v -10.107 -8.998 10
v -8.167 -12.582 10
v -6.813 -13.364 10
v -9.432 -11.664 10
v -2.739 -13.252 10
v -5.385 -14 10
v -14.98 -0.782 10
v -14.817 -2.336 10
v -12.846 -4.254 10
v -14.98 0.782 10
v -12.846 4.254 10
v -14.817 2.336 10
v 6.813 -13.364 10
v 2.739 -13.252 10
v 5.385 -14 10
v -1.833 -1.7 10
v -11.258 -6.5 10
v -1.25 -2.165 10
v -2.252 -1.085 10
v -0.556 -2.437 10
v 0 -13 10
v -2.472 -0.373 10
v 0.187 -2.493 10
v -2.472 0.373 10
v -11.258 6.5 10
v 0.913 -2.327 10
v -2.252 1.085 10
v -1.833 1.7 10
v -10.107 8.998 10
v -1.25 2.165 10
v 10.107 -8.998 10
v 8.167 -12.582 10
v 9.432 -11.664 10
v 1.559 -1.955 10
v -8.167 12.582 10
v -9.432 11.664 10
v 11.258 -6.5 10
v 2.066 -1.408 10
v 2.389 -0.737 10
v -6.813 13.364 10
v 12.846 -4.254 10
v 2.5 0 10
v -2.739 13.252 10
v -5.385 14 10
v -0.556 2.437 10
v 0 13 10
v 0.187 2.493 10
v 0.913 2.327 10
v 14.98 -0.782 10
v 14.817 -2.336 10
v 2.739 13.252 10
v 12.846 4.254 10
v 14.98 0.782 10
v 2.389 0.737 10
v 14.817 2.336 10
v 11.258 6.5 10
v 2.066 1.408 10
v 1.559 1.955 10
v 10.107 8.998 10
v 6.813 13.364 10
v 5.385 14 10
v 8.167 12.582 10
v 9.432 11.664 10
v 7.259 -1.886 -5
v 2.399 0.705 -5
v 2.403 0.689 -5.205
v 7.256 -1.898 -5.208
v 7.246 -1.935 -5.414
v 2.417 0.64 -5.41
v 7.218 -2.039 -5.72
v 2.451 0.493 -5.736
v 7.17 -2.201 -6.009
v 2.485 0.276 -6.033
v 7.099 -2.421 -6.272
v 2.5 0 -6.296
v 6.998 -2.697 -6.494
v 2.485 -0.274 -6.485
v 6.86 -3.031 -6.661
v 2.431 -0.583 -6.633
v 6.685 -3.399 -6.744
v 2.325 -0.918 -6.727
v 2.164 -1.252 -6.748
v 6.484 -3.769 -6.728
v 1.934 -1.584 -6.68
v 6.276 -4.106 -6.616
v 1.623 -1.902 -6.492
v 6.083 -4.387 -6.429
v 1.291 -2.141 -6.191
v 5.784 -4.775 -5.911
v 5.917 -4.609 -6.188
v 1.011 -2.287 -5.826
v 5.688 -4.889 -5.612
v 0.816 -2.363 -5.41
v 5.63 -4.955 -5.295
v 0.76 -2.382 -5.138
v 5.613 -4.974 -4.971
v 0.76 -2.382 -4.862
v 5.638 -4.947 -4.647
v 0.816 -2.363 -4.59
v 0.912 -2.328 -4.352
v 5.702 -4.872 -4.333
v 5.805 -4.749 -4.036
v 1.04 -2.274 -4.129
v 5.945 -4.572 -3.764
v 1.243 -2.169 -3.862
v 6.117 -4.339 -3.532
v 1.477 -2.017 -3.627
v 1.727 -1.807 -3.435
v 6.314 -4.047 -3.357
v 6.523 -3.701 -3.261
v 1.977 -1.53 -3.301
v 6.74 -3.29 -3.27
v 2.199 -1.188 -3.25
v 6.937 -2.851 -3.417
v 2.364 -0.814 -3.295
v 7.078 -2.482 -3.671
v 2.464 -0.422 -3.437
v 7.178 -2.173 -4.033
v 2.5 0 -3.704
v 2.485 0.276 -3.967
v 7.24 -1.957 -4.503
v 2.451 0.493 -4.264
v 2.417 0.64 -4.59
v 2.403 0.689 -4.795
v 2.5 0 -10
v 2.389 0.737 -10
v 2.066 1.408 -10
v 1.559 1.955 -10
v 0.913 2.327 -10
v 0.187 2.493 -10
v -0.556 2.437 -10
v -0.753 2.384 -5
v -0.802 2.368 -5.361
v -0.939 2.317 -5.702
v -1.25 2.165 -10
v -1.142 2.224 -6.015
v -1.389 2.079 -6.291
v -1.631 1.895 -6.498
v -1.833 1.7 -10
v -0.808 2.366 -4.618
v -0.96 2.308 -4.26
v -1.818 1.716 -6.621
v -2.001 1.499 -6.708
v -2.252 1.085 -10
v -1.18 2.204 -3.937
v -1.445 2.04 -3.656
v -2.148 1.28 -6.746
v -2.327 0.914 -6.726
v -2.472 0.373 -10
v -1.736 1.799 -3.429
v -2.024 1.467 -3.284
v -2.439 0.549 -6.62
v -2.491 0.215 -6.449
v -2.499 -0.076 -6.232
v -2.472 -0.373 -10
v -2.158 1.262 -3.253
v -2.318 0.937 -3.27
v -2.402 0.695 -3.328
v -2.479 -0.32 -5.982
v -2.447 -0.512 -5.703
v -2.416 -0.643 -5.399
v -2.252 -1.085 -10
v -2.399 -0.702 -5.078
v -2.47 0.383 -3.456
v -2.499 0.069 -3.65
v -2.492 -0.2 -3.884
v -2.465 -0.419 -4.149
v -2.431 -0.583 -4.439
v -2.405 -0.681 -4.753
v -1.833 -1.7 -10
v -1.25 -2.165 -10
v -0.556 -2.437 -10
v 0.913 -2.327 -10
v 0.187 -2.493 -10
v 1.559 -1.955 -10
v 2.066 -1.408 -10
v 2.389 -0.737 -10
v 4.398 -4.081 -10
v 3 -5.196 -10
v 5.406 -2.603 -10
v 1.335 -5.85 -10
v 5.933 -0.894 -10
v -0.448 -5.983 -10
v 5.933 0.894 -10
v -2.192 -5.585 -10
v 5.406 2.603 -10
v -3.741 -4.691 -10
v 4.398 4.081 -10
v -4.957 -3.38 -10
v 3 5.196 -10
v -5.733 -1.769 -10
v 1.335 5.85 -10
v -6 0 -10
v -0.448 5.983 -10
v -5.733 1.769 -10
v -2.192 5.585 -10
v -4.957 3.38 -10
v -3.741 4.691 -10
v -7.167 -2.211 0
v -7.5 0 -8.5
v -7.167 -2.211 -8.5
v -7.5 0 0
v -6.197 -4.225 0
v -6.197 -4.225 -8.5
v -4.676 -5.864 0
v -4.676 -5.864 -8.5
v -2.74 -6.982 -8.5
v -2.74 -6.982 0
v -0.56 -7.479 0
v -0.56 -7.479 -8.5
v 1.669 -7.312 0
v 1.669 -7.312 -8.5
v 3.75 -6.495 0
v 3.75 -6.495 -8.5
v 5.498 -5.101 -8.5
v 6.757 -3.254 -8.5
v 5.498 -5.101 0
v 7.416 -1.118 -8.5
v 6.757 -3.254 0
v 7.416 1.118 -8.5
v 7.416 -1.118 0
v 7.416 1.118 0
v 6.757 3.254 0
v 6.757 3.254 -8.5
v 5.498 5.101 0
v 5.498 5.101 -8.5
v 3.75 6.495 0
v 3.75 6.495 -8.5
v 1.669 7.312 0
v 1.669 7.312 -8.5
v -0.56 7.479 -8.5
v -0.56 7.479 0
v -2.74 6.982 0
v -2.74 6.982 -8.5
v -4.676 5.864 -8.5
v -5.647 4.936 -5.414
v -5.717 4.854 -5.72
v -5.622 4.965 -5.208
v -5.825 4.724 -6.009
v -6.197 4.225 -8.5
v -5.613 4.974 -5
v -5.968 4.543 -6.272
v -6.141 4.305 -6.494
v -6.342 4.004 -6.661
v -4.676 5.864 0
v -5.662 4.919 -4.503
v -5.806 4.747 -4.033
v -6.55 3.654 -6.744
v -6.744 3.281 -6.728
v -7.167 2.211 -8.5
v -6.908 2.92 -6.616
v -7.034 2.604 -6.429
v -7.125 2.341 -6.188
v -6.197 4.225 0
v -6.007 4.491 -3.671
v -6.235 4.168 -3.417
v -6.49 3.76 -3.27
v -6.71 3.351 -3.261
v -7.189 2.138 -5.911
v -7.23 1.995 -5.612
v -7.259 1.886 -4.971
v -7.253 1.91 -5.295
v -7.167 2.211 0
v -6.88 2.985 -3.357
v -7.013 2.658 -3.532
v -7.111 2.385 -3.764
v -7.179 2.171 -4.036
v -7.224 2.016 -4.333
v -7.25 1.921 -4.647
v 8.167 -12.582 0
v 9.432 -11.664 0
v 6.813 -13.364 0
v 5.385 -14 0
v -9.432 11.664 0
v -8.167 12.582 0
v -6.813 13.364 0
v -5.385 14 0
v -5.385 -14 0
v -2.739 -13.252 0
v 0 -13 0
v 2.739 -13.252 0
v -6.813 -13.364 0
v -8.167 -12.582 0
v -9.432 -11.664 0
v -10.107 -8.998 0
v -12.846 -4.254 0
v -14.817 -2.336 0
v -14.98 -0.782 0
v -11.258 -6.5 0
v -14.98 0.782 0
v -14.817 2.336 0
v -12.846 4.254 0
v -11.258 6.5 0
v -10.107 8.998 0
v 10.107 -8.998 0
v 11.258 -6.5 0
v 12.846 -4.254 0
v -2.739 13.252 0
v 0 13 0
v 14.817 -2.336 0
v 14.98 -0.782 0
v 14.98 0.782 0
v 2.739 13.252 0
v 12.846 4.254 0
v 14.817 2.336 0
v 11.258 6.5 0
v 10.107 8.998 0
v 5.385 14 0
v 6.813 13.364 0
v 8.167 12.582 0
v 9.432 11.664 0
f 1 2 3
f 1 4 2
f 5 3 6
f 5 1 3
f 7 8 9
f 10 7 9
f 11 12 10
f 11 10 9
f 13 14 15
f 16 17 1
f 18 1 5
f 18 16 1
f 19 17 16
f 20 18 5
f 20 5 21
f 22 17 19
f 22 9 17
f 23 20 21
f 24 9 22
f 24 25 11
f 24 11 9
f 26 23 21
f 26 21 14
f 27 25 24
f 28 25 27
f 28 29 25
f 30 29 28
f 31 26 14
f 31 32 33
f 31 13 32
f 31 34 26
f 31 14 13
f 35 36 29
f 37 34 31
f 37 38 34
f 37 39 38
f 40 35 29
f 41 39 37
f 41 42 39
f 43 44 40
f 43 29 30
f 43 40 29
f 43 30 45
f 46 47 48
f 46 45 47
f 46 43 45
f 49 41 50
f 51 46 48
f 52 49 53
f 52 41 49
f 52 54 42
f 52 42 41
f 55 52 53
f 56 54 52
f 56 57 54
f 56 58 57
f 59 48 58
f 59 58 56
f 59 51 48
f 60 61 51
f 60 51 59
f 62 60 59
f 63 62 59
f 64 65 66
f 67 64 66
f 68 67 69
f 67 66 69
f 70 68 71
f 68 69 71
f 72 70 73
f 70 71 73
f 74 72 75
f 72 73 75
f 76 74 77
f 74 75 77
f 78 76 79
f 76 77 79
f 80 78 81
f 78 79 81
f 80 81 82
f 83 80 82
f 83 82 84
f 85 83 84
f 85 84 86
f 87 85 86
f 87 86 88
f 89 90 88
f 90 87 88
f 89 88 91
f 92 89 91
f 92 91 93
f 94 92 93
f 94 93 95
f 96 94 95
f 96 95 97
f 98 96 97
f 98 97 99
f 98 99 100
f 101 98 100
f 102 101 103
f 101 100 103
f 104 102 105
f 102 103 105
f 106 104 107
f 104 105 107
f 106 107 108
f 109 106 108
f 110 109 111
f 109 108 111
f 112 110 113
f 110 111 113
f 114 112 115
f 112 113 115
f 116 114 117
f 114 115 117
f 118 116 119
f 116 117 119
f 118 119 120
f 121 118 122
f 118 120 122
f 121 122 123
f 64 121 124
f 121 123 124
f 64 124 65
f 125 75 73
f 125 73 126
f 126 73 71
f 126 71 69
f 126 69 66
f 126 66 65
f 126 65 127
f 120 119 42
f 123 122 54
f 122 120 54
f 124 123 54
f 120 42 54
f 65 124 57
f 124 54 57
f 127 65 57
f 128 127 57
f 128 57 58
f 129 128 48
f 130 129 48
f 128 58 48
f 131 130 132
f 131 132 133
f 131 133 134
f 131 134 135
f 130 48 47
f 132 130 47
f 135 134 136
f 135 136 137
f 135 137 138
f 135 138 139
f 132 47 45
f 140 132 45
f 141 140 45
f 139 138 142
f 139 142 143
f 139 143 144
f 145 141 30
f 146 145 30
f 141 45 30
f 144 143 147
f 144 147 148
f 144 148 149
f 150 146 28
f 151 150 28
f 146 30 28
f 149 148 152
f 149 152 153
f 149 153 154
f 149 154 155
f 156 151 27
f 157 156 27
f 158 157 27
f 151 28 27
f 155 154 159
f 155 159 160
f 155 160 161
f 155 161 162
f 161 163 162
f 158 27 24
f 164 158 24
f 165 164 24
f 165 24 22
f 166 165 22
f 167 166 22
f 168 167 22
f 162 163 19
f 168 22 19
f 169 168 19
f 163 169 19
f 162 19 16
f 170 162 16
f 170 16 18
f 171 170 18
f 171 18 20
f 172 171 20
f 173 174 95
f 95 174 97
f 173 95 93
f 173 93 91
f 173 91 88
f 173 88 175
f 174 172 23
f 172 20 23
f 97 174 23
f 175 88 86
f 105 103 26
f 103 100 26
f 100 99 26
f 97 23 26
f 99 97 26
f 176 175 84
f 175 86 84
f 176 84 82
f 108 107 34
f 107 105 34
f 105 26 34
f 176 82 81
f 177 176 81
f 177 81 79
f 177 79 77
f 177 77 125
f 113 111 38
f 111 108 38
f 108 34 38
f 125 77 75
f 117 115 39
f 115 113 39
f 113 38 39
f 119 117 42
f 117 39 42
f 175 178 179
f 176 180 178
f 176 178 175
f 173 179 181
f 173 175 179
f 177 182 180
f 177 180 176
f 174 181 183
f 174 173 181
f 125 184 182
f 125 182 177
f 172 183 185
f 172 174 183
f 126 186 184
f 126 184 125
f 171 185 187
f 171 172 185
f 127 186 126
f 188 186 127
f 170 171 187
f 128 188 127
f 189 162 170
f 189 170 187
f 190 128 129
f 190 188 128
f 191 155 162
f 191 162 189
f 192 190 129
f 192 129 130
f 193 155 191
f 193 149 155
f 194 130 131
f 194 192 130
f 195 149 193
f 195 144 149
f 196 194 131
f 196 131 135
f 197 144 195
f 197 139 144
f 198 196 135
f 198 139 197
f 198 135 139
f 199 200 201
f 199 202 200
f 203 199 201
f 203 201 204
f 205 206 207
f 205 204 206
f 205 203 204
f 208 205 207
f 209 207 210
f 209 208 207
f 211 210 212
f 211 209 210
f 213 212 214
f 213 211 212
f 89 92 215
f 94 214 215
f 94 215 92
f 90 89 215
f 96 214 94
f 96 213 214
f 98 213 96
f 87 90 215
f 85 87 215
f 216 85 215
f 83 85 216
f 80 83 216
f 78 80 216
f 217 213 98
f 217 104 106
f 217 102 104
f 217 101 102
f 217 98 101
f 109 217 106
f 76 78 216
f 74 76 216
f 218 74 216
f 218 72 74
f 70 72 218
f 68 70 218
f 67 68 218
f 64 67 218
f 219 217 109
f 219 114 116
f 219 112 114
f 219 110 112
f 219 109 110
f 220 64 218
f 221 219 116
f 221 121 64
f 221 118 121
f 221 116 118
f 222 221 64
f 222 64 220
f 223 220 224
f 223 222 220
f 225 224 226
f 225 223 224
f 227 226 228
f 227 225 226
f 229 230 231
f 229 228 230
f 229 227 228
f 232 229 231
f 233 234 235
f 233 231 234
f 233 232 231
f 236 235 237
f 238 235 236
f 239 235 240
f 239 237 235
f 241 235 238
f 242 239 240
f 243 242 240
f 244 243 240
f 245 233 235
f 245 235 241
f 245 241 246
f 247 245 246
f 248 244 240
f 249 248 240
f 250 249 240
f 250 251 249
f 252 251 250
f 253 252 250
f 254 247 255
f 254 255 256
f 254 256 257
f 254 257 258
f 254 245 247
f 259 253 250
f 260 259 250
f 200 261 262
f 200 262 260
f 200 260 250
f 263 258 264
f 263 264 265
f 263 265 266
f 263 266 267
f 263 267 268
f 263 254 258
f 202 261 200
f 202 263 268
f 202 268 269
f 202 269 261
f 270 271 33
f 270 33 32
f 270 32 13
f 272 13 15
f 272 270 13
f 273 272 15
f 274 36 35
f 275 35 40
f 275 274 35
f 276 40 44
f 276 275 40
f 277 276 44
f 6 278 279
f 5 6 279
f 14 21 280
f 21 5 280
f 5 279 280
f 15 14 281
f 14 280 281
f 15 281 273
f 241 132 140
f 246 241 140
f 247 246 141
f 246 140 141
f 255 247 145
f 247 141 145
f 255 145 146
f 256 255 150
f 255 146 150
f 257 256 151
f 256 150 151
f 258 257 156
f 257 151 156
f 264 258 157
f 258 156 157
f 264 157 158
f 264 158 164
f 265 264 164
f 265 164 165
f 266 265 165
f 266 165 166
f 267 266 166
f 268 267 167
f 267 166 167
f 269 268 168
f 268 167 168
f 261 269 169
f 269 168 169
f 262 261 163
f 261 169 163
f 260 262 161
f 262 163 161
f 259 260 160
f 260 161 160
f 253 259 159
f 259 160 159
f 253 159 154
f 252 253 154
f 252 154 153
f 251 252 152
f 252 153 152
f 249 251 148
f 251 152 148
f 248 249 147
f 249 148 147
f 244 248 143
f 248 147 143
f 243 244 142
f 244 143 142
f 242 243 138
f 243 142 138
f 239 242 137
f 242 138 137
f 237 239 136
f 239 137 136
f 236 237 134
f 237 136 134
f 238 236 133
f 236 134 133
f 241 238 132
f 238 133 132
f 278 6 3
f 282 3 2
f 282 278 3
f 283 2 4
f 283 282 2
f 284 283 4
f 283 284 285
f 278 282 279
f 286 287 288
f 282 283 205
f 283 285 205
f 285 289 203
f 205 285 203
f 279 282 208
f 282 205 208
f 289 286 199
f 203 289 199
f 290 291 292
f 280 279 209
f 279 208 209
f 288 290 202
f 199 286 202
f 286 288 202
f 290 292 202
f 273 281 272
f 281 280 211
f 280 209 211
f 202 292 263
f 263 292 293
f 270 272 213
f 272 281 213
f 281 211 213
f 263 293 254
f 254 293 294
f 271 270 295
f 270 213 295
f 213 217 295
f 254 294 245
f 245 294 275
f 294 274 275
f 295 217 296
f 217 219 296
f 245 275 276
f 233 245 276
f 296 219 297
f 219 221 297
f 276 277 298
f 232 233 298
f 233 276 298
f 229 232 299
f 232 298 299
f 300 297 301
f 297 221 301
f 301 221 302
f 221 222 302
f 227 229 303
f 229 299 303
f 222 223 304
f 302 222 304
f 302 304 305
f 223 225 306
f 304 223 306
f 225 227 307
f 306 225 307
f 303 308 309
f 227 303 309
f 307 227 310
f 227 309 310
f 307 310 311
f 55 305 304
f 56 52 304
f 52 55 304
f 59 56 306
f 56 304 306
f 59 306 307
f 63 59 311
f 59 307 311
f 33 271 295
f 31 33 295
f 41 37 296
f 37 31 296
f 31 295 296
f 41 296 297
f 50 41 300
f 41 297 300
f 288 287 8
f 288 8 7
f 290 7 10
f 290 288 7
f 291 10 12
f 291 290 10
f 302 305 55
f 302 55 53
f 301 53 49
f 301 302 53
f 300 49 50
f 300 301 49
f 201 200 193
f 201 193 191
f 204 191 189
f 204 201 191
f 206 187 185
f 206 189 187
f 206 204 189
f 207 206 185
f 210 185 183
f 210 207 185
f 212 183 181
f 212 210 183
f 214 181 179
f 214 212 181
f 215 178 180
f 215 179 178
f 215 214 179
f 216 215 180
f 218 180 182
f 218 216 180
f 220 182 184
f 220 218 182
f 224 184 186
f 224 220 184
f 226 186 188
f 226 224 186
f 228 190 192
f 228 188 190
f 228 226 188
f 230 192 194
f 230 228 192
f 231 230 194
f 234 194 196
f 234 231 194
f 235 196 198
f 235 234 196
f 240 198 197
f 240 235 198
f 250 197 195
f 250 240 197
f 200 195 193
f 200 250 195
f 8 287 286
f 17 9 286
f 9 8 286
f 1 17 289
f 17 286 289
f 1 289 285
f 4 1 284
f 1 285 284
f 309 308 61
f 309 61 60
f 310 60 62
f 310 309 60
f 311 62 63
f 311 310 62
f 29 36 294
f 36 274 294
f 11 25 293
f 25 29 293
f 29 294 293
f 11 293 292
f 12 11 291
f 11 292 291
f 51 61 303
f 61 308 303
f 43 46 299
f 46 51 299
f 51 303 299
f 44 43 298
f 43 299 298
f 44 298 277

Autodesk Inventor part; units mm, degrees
ref_plane "YZ Plane" through (0, 0, 0) normal (1, 0, 0) x (0, 1, 0)
ref_plane "XZ Plane" through (0, 0, 0) normal (0, 1, 0) x (-1, 0, 0)
sketch "Skizze1" plane through (0, 0, 0) normal (0, 0, 1) x (1, 0, 0)
  circle A0 centre (0, 0) radius 15
  line L0 (0, 15) -> (0, -15) construction
  arc A1 (-5.3852, 14) -> (5.3852, 14) centre (0, 28) ccw
  point P0 (0, 0)
  point P1 (0, 13)
  dimension "d0" = 30
  dimension "d1" = 15
  dimension "d2" = 13
extrude "Extrusion1" add sketch "Skizze1" along normal blind 10
extrude "Extrusion2" cut sketch "Skizze1" along normal blind 10 contours A1 A0 picked at (0.6105, 13.7041)
pattern_circular "Runde Anordnung1" count 6 over 360 about axis through (0, 0, 0) along (0, 0, 1) of "Extrusion2"
sketch "Skizze2" plane through (0, 0, 0) normal (0, 0, -1) x (-1, 0, 0)
  circle A0 centre (0, 0) radius 7.5
  dimension "d10" = 15
extrude "Extrusion3" add sketch "Skizze2" along normal blind 10
chamfer "Fasen1" distance 1.5 angle 45 1 edges at (7.5, 0, -10)
sketch "Skizze3" plane through (0, 0, 10) normal (0, 0, 1) x (1, 0, 0)
  circle A0 centre (0, 0) radius 2.5
  dimension "d16" = 5
extrude "Extrusion4" cut sketch "Skizze3" against normal up to surface (20 mm away)
ref_plane "Arbeitsebene2" through (-5.3852, -14, 0) normal (0.8825, -0.4703, 0) x (0.4703, 0.8825, 0)
sketch "Skizze5" plane through (-5.3852, -14, 0) normal (0.8825, -0.4703, 0) x (0.4703, 0.8825, 0)
  circle A0 centre (14.8877, -5) radius 1.75
  point P0 (14.8877, 0)
  dimension "d21" = 3.5
  dimension "d22" = 5
extrude "Extrusion5" cut sketch "Skizze5" along normal through all both and the other way through all
thread "Gewinde2" size "M3.5x0.6" class "6H" standard "ANSI Metric M Profile" length 25
thread "Gewinde3" size "M3.5x0.6" class "6H" standard "ANSI Metric M Profile" length 25
properties part number "bolt" material "Stahl, galvanisiert"
